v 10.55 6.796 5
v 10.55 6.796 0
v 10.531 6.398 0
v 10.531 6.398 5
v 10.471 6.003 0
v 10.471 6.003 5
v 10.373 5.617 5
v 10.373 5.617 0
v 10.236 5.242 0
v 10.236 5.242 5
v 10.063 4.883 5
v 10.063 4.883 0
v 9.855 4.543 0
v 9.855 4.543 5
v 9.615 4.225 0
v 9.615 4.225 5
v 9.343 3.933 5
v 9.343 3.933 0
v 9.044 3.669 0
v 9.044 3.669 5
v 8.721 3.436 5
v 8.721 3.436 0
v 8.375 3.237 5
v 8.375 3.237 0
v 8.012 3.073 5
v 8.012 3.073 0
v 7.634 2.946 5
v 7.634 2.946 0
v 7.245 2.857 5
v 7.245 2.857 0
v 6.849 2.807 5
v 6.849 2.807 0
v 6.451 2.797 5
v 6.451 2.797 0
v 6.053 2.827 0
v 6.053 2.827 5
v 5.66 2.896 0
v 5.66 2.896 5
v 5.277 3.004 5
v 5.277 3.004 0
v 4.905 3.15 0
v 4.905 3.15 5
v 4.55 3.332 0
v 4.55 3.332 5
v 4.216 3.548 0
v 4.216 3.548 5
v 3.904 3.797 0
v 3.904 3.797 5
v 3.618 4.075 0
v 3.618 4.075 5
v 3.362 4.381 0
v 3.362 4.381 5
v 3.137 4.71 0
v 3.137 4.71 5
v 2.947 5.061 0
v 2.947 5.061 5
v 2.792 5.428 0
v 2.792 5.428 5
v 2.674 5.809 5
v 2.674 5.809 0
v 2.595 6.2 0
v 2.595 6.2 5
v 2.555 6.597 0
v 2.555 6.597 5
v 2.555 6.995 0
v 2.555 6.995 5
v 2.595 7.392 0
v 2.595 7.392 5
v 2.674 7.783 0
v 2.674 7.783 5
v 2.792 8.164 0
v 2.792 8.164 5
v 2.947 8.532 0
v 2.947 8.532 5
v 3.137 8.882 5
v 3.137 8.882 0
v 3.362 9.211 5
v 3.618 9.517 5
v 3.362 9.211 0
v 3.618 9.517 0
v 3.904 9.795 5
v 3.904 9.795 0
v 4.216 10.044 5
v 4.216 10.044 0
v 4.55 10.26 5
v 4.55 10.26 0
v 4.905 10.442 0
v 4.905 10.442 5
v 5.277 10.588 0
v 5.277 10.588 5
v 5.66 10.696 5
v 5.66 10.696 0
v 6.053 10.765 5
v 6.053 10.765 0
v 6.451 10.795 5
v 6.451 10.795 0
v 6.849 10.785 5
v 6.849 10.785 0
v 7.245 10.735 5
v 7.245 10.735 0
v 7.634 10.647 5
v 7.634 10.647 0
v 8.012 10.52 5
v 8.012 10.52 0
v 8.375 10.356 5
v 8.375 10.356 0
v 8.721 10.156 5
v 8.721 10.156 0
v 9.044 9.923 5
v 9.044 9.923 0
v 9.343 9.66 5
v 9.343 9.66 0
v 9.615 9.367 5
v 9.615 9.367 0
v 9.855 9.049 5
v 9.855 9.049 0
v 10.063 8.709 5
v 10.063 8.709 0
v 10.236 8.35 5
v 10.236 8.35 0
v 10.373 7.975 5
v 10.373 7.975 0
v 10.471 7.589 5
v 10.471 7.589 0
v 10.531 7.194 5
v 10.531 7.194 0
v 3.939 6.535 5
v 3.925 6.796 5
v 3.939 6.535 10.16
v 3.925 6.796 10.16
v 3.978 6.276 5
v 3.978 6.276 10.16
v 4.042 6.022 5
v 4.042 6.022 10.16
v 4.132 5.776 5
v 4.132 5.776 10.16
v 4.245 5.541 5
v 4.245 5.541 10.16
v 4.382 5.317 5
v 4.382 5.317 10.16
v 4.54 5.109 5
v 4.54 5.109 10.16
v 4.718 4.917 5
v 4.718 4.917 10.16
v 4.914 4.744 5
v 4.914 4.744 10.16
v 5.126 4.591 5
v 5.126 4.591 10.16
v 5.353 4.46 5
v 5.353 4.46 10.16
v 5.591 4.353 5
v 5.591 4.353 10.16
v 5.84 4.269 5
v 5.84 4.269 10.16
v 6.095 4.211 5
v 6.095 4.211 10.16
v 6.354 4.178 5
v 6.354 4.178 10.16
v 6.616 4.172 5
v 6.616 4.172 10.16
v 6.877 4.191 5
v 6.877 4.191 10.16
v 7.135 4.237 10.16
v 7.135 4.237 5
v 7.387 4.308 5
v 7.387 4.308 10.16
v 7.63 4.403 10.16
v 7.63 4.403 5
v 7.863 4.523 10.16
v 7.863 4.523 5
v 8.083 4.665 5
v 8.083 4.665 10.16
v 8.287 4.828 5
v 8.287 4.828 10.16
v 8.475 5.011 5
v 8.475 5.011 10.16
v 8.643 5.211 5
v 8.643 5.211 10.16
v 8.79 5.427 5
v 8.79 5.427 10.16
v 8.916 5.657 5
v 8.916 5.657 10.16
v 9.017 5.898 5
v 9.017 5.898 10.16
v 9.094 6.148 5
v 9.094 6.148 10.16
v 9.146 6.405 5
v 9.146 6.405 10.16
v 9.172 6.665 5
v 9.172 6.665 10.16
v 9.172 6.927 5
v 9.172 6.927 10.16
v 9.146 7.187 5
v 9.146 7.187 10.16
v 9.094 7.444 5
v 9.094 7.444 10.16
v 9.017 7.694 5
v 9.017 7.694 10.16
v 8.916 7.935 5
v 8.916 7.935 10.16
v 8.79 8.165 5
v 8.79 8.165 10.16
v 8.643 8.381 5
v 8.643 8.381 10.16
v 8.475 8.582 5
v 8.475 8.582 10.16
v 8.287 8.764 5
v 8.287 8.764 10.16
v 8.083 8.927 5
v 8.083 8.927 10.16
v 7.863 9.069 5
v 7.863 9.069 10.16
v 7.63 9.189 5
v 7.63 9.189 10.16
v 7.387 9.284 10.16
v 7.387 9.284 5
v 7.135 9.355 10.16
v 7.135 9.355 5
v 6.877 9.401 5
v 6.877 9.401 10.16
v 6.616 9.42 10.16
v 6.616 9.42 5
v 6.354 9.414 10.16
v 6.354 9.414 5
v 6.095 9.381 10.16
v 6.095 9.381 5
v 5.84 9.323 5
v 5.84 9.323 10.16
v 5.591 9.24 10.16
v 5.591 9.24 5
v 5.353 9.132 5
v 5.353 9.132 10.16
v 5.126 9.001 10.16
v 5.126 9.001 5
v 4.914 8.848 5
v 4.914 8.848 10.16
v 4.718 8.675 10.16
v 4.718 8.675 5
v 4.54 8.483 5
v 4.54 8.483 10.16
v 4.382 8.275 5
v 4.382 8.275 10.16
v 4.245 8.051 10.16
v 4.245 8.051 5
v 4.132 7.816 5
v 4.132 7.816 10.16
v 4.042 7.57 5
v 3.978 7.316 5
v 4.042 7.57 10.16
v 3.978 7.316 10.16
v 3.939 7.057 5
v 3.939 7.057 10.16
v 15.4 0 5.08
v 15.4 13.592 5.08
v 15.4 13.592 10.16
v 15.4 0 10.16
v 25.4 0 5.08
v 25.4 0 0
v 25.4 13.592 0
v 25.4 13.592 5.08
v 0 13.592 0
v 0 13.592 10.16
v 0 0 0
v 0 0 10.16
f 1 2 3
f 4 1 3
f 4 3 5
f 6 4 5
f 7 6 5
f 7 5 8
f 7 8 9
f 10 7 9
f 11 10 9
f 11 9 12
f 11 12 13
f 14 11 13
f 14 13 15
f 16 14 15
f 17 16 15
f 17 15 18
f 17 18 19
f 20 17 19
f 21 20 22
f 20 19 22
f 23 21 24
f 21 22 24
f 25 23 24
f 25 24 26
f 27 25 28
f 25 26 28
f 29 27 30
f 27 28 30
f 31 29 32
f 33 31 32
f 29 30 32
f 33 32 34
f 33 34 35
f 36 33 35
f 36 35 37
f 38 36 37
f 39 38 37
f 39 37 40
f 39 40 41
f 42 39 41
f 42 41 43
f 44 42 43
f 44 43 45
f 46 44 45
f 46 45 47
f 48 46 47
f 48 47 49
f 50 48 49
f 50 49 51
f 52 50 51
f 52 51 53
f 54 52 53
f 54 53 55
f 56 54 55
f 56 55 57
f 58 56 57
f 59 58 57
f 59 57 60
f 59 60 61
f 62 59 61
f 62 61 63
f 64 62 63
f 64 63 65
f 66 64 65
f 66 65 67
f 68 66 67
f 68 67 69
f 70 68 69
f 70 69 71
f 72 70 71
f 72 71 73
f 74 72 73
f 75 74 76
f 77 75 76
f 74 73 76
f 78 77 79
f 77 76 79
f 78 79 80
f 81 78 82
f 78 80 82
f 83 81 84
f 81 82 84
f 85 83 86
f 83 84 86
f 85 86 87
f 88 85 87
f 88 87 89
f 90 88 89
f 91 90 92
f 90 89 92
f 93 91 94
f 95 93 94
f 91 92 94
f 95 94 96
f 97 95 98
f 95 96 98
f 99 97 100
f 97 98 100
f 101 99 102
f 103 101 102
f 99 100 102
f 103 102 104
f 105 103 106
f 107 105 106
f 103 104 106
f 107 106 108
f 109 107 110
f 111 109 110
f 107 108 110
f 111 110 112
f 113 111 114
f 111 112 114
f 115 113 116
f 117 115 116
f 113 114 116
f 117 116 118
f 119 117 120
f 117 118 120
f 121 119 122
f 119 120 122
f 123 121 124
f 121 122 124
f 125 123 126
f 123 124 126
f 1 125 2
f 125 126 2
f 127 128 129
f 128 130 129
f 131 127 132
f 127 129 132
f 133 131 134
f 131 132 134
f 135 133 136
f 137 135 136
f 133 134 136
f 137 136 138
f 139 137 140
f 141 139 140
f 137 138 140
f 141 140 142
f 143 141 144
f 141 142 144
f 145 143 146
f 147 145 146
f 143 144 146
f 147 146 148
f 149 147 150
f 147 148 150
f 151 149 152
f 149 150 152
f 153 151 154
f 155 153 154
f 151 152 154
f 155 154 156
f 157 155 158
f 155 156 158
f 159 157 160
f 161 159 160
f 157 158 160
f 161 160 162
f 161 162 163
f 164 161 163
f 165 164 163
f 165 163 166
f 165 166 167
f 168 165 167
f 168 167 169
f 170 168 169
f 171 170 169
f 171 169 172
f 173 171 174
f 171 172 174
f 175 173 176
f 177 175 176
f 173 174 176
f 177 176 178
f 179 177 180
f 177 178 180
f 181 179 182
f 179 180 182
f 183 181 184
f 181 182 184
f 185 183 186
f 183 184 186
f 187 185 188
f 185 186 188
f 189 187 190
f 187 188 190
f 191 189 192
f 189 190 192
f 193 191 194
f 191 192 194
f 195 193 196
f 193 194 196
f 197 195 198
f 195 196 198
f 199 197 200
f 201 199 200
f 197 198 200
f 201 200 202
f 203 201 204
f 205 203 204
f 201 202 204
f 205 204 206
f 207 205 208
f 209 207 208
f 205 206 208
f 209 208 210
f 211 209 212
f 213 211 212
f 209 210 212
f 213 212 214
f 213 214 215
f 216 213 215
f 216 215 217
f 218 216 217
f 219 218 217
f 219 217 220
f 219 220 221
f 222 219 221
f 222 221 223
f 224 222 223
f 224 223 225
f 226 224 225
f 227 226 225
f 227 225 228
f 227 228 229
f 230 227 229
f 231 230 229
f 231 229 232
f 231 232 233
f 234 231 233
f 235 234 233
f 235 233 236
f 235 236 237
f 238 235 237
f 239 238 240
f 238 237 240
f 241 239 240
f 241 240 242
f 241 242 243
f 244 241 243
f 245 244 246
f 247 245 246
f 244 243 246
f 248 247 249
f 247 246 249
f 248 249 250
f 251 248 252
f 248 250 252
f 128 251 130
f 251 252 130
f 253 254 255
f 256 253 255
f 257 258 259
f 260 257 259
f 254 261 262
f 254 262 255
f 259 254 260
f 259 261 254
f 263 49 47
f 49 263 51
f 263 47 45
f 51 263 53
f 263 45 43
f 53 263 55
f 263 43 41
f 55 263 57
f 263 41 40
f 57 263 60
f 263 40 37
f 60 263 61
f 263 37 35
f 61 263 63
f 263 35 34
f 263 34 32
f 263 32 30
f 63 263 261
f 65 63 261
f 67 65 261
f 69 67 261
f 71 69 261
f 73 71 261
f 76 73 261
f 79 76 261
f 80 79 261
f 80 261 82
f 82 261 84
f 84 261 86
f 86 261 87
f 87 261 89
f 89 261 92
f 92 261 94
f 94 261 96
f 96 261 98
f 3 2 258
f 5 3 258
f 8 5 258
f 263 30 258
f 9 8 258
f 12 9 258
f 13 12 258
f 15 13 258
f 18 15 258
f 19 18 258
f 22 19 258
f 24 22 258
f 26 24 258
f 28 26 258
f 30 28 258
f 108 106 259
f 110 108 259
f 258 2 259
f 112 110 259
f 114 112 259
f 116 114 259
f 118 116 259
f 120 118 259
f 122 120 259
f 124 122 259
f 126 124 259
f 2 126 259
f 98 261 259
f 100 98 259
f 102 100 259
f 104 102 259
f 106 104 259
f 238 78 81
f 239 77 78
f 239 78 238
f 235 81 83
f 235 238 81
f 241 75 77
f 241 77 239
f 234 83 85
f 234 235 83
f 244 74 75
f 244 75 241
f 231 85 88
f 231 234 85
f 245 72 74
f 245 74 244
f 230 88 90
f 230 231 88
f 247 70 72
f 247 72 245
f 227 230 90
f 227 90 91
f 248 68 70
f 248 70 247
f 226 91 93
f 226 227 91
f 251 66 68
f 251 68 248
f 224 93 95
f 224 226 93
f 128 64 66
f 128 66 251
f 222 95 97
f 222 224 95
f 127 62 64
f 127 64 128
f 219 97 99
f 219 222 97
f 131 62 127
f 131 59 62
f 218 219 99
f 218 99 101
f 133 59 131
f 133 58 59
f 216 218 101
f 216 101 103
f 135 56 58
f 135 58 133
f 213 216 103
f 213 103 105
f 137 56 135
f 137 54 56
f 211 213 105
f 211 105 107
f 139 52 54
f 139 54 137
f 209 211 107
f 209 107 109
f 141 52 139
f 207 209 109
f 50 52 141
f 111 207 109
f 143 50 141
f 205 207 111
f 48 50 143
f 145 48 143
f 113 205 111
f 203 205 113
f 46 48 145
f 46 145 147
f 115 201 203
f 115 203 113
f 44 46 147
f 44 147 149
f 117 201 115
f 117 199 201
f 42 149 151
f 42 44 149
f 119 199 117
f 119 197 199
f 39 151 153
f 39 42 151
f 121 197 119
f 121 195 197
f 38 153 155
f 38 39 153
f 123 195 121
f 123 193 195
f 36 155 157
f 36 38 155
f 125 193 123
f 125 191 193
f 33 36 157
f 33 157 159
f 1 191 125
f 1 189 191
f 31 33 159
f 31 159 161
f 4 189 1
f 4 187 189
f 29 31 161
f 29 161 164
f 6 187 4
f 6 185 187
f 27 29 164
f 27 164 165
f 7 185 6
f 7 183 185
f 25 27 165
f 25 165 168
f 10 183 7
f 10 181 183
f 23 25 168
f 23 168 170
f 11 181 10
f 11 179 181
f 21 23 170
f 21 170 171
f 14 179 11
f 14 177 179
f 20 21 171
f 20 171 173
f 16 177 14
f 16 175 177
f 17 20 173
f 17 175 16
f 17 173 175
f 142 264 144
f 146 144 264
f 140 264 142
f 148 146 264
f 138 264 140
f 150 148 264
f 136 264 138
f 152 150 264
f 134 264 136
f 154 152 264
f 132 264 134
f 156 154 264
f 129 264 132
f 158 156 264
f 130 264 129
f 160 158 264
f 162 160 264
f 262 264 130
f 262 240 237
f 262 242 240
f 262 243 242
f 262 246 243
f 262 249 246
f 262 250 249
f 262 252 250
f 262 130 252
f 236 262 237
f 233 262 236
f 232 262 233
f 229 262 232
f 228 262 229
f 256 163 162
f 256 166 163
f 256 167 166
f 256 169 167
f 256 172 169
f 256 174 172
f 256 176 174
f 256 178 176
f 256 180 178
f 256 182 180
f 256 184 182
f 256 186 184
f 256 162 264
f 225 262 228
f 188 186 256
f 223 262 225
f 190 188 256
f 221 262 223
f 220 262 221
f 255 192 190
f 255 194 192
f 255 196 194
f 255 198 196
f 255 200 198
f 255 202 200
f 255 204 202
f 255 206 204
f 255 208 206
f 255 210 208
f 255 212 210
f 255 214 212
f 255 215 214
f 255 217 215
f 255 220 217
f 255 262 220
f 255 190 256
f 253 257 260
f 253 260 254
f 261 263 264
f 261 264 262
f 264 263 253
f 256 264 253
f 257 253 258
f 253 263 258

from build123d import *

# Parameters (mm, degrees)
F0_W           = 25.4
F0_H           = 13.5920988396
F1_DEPTH       = 10.16
F2_D           = 5.25
F2_CBORE_D     = 8
F2_CBORE_DEPTH = 5
F3_W           = 10
F3_H           = 5.08
F4_DEPTH       = 25.4


with BuildPart() as f1:
    # F0 (on Top) → F1 (new body)
    with BuildSketch(Plane.XY):
        with Locations((12.7, 6.7960494198)):
            Rectangle(F0_W, F0_H)
    extrude(amount=F1_DEPTH)

    # F2 (through all)
    with Locations(Plane(origin=(0, 0, 0), x_dir=(1, 0, 0), z_dir=(0, 0, -1))):
        with Locations((6.5504941158, -6.7960494198)):
            CounterBoreHole(F2_D / 2, F2_CBORE_D / 2, F2_CBORE_DEPTH)

    # F3 (on face) → F4 (cut)
    with BuildSketch(Plane(origin=(0, 13.5920988396, 0), x_dir=(-1, 0, 0), z_dir=(0, 1, 0))):
        with Locations((-20.4, 7.62)):
            Rectangle(F3_W, F3_H)
    extrude(amount=-F4_DEPTH, mode=Mode.SUBTRACT)


solid = f1.part
